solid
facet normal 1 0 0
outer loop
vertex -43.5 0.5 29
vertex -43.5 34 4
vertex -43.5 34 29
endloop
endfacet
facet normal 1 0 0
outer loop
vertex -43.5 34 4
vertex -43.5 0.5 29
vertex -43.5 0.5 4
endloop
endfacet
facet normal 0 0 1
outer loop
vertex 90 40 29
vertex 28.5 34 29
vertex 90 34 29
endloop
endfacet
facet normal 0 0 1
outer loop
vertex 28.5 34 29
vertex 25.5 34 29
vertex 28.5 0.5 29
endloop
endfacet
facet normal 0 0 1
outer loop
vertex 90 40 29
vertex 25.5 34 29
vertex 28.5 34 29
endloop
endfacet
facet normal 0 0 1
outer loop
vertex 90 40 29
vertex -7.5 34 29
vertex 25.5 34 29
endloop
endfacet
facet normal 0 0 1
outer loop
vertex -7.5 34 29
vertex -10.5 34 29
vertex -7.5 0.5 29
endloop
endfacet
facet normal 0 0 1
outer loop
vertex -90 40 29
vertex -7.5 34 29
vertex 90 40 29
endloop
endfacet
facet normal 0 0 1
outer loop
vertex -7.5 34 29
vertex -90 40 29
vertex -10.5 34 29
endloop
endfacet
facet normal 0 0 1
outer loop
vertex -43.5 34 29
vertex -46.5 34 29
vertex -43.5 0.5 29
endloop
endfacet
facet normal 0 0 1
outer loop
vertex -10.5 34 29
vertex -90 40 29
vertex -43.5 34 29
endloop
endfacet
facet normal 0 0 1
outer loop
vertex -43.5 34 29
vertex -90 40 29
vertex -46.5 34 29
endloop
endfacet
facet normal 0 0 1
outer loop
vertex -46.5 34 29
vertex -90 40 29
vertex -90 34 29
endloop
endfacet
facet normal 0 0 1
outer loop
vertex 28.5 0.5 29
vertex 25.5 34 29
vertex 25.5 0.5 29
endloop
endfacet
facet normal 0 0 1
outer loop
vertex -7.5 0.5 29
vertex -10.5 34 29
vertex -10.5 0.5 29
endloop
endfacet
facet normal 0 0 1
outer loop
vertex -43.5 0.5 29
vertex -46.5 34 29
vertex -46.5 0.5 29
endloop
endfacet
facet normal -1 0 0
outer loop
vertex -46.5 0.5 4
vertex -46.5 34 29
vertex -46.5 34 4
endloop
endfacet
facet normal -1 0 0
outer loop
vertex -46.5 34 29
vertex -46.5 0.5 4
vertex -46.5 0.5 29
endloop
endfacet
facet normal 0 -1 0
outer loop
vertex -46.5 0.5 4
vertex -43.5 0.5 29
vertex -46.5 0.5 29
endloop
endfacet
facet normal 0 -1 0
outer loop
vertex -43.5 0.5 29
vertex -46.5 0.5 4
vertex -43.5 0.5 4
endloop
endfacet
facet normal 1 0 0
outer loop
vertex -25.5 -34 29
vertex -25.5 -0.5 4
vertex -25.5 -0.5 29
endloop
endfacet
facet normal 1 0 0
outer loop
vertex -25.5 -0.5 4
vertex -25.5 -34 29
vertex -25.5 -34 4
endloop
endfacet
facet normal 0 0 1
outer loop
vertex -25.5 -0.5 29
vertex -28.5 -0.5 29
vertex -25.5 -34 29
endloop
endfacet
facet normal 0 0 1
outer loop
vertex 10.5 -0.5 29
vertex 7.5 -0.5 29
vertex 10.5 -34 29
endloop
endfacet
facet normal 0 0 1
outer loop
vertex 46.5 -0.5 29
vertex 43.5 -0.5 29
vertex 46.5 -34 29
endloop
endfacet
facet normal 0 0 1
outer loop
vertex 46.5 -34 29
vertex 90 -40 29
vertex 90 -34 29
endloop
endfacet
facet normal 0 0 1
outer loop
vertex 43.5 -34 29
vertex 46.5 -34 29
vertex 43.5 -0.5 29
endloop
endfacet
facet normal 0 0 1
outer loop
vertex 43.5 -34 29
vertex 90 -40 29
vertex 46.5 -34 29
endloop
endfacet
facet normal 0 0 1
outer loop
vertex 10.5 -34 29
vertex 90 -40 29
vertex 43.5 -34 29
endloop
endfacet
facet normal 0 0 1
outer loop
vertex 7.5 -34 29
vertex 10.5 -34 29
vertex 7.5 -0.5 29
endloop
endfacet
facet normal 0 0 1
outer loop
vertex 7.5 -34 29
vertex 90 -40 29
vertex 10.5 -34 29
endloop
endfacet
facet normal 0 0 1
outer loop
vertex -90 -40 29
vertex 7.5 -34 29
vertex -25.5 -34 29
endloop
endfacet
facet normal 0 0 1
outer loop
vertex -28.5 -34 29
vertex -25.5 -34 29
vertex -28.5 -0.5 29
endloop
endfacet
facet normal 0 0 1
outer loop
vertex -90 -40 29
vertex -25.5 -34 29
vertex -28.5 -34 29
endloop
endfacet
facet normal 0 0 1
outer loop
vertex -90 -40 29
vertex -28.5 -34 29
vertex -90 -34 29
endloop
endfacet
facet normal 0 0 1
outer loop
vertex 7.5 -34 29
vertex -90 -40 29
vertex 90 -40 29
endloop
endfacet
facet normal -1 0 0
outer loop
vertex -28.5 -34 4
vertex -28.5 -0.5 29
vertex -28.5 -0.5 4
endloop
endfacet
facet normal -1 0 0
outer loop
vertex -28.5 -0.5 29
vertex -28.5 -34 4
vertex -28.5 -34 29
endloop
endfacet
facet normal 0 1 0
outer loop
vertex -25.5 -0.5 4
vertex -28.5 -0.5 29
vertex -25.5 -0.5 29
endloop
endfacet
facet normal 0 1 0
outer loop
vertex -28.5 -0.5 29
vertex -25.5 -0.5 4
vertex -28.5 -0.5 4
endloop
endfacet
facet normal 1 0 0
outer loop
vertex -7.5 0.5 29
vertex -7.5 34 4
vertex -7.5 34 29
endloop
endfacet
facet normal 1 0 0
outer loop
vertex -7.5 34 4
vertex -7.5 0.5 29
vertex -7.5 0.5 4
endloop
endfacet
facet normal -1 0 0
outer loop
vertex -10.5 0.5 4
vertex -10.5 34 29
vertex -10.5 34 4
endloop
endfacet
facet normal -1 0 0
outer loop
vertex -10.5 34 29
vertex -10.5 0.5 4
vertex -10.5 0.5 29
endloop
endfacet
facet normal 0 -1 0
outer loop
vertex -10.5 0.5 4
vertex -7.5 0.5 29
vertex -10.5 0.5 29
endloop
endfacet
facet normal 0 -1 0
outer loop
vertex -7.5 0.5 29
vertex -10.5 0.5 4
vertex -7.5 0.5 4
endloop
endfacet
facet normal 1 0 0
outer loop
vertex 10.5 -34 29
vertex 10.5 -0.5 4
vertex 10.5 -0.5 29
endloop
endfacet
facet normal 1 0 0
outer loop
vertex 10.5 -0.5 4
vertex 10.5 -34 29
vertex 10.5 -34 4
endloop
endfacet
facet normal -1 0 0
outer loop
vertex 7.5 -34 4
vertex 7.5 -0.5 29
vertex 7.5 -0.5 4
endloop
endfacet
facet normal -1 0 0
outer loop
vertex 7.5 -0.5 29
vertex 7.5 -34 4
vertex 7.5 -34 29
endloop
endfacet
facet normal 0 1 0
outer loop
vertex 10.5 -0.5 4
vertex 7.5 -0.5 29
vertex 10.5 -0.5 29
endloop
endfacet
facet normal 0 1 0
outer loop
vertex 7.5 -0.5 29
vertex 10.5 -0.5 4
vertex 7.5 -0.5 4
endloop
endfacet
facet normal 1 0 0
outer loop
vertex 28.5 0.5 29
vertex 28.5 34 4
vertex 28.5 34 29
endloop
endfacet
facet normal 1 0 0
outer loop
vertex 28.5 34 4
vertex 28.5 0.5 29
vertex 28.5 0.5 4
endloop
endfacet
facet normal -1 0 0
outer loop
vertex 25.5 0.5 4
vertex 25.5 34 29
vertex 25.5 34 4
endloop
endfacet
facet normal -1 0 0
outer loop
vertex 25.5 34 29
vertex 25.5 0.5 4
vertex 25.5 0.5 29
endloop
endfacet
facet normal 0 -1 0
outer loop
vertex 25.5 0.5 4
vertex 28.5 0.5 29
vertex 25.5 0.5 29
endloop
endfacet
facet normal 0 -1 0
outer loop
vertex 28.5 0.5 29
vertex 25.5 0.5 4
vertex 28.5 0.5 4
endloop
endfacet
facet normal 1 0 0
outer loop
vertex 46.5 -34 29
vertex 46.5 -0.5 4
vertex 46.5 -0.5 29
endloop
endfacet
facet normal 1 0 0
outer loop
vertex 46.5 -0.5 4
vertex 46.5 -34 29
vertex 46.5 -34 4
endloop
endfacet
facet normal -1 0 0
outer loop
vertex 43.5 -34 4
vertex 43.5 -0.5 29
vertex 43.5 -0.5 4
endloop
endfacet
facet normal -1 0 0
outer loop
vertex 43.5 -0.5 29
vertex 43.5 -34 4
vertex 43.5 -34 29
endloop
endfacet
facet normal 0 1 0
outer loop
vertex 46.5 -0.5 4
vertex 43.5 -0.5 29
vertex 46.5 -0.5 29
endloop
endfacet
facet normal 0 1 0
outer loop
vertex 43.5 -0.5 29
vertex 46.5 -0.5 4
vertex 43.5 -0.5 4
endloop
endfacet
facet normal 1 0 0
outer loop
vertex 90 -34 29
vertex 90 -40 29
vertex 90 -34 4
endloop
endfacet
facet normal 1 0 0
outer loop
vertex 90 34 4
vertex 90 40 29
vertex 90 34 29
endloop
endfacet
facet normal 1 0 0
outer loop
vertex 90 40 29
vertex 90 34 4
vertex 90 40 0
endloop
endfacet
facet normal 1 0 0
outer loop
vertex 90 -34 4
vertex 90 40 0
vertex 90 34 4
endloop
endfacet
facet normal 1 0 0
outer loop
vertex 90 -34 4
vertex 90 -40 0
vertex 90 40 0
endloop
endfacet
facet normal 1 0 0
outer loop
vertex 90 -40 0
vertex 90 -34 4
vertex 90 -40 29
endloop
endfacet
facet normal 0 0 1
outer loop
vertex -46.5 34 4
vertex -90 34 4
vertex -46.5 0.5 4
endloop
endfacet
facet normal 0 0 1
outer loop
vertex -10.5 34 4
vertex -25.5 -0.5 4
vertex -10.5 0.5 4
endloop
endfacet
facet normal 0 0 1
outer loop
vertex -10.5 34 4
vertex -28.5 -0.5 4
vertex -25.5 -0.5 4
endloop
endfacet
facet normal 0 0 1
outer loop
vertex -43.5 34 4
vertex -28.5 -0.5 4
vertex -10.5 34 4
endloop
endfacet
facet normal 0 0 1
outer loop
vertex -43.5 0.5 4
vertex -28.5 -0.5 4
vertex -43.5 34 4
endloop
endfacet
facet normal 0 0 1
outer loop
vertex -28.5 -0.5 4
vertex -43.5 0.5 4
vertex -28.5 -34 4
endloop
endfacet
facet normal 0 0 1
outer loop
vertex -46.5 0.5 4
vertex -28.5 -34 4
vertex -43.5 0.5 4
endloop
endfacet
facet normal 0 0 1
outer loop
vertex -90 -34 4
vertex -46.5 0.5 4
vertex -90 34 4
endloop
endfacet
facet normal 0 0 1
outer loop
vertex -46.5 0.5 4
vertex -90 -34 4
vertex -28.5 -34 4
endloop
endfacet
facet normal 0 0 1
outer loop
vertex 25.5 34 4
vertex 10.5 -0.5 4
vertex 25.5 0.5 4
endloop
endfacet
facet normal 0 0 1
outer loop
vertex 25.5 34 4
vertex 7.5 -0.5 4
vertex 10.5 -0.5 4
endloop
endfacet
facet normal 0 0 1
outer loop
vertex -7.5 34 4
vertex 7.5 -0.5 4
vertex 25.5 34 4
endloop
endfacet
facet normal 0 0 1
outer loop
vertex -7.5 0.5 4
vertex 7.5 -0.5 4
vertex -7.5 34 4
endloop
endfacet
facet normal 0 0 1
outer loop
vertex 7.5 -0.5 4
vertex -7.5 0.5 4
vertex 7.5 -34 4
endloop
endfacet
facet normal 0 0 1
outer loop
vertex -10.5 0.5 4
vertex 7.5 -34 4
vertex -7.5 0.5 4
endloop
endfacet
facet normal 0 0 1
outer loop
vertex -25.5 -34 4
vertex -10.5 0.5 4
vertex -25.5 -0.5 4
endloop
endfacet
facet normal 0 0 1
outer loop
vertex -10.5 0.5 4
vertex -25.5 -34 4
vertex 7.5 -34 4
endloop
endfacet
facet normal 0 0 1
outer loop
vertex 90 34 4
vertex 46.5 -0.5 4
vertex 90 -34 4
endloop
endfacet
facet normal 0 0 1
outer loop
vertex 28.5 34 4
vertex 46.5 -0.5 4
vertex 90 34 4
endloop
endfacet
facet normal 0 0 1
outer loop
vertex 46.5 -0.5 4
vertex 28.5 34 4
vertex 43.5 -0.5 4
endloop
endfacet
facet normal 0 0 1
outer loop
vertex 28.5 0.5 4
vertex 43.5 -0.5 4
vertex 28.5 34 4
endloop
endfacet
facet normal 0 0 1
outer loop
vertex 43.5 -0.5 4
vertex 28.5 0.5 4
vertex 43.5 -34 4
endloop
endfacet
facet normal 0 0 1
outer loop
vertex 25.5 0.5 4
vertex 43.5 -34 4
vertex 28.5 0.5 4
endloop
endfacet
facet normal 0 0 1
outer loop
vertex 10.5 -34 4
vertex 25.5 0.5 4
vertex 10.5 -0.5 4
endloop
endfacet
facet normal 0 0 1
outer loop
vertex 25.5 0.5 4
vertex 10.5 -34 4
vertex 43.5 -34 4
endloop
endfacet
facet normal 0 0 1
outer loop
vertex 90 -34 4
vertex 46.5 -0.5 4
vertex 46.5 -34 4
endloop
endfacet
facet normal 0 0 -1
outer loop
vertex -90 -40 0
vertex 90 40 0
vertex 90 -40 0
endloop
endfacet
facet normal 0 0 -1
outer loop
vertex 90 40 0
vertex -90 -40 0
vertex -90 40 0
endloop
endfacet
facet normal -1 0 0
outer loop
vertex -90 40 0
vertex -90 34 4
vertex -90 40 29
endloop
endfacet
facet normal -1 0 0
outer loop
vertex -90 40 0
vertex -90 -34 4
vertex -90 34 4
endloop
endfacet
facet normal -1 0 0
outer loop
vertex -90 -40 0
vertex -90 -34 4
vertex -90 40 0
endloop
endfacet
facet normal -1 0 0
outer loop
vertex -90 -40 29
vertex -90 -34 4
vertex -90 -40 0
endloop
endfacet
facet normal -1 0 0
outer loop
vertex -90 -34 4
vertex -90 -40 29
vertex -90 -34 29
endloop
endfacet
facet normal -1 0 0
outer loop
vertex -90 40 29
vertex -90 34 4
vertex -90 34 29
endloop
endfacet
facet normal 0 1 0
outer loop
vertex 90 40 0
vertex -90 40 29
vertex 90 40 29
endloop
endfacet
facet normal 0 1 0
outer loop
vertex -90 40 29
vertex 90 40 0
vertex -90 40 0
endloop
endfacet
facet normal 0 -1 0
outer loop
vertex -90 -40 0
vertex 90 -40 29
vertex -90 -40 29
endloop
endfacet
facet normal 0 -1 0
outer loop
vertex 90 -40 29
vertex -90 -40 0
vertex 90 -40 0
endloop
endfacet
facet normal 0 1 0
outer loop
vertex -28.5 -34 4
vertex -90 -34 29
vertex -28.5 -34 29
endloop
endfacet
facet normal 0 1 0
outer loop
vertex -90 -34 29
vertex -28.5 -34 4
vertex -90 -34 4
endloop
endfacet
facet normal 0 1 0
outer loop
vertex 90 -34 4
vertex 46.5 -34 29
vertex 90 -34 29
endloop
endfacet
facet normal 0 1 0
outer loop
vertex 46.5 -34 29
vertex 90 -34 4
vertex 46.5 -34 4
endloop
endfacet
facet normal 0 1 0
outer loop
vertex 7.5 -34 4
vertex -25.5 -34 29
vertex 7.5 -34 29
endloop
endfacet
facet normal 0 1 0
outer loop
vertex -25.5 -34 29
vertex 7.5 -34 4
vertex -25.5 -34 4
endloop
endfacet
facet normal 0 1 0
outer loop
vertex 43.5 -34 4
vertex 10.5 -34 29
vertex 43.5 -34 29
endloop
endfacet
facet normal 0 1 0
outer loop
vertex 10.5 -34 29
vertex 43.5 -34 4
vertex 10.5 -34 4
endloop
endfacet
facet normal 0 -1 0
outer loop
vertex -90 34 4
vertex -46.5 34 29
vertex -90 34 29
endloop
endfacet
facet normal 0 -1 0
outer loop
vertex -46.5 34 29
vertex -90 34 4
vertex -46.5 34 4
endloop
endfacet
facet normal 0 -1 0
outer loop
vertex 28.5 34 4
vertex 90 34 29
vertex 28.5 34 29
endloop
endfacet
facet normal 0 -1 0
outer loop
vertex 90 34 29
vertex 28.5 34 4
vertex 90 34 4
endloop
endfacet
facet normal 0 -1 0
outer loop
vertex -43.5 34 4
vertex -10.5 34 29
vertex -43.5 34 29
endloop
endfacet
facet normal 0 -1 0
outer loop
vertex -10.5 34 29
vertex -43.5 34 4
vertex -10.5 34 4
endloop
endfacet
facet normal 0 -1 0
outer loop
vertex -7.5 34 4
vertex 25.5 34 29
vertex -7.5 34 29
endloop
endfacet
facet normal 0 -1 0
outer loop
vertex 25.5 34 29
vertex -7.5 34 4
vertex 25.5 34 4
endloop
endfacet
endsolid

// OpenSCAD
$fn = 32;

// ----------------------------------------------------------------------
// Rib frame 180 x 80 x 29
// 6 ribs at 18 mm pitch, staggered
// ----------------------------------------------------------------------

// --- parameters (mm) ---
frame = [180, 80, 4];  // base plate size (x, y, z)
rail_w = 6;            // side rail width
ribs = 6;              // number of ribs
rib_t = 3;             // rib thickness
rib_h = 25;            // rib height above the base plate
pitch = 18;            // pitch between rib centres

// --- derived feature positions (mm) ---
span = (ribs - 1) * pitch;          // = 90   distance between the outer ribs
origin_x = -span / 2;               // = -45   X of the first rib
rib_len = frame[1] / 2 - rail_w + 0.5;  // = 34.5   length of a staggered rib
rib_y = 0.5 + rib_len / 2;          // = 17.75   Y of a staggered rib centre
row_offset = 2 * rib_y;             // = 35.5   distance between the two rows
feature_centers = [
  [origin_x + 0 * pitch, rib_y],
  [origin_x + 1 * pitch, -rib_y],
  [origin_x + 2 * pitch, rib_y],
  [origin_x + 3 * pitch, -rib_y],
  [origin_x + 4 * pitch, rib_y],
  [origin_x + 5 * pitch, -rib_y]
];   // rib centre line, drives the rib loop

// base plate, two side rails, then the ribs read straight off feature_centers
union() {
  translate([-frame[0] / 2, -frame[1] / 2, 0]) cube(frame);
  translate([-frame[0] / 2, -frame[1] / 2, 0]) cube([frame[0], rail_w, frame[2] + rib_h]);
  translate([-frame[0] / 2, frame[1] / 2 - rail_w, 0]) cube([frame[0], rail_w, frame[2] + rib_h]);
  for (centre = feature_centers)
    translate([centre[0] - rib_t / 2, centre[1] - rib_len / 2, frame[2] - 1])
      cube([rib_t, rib_len, rib_h + 1]);
}
